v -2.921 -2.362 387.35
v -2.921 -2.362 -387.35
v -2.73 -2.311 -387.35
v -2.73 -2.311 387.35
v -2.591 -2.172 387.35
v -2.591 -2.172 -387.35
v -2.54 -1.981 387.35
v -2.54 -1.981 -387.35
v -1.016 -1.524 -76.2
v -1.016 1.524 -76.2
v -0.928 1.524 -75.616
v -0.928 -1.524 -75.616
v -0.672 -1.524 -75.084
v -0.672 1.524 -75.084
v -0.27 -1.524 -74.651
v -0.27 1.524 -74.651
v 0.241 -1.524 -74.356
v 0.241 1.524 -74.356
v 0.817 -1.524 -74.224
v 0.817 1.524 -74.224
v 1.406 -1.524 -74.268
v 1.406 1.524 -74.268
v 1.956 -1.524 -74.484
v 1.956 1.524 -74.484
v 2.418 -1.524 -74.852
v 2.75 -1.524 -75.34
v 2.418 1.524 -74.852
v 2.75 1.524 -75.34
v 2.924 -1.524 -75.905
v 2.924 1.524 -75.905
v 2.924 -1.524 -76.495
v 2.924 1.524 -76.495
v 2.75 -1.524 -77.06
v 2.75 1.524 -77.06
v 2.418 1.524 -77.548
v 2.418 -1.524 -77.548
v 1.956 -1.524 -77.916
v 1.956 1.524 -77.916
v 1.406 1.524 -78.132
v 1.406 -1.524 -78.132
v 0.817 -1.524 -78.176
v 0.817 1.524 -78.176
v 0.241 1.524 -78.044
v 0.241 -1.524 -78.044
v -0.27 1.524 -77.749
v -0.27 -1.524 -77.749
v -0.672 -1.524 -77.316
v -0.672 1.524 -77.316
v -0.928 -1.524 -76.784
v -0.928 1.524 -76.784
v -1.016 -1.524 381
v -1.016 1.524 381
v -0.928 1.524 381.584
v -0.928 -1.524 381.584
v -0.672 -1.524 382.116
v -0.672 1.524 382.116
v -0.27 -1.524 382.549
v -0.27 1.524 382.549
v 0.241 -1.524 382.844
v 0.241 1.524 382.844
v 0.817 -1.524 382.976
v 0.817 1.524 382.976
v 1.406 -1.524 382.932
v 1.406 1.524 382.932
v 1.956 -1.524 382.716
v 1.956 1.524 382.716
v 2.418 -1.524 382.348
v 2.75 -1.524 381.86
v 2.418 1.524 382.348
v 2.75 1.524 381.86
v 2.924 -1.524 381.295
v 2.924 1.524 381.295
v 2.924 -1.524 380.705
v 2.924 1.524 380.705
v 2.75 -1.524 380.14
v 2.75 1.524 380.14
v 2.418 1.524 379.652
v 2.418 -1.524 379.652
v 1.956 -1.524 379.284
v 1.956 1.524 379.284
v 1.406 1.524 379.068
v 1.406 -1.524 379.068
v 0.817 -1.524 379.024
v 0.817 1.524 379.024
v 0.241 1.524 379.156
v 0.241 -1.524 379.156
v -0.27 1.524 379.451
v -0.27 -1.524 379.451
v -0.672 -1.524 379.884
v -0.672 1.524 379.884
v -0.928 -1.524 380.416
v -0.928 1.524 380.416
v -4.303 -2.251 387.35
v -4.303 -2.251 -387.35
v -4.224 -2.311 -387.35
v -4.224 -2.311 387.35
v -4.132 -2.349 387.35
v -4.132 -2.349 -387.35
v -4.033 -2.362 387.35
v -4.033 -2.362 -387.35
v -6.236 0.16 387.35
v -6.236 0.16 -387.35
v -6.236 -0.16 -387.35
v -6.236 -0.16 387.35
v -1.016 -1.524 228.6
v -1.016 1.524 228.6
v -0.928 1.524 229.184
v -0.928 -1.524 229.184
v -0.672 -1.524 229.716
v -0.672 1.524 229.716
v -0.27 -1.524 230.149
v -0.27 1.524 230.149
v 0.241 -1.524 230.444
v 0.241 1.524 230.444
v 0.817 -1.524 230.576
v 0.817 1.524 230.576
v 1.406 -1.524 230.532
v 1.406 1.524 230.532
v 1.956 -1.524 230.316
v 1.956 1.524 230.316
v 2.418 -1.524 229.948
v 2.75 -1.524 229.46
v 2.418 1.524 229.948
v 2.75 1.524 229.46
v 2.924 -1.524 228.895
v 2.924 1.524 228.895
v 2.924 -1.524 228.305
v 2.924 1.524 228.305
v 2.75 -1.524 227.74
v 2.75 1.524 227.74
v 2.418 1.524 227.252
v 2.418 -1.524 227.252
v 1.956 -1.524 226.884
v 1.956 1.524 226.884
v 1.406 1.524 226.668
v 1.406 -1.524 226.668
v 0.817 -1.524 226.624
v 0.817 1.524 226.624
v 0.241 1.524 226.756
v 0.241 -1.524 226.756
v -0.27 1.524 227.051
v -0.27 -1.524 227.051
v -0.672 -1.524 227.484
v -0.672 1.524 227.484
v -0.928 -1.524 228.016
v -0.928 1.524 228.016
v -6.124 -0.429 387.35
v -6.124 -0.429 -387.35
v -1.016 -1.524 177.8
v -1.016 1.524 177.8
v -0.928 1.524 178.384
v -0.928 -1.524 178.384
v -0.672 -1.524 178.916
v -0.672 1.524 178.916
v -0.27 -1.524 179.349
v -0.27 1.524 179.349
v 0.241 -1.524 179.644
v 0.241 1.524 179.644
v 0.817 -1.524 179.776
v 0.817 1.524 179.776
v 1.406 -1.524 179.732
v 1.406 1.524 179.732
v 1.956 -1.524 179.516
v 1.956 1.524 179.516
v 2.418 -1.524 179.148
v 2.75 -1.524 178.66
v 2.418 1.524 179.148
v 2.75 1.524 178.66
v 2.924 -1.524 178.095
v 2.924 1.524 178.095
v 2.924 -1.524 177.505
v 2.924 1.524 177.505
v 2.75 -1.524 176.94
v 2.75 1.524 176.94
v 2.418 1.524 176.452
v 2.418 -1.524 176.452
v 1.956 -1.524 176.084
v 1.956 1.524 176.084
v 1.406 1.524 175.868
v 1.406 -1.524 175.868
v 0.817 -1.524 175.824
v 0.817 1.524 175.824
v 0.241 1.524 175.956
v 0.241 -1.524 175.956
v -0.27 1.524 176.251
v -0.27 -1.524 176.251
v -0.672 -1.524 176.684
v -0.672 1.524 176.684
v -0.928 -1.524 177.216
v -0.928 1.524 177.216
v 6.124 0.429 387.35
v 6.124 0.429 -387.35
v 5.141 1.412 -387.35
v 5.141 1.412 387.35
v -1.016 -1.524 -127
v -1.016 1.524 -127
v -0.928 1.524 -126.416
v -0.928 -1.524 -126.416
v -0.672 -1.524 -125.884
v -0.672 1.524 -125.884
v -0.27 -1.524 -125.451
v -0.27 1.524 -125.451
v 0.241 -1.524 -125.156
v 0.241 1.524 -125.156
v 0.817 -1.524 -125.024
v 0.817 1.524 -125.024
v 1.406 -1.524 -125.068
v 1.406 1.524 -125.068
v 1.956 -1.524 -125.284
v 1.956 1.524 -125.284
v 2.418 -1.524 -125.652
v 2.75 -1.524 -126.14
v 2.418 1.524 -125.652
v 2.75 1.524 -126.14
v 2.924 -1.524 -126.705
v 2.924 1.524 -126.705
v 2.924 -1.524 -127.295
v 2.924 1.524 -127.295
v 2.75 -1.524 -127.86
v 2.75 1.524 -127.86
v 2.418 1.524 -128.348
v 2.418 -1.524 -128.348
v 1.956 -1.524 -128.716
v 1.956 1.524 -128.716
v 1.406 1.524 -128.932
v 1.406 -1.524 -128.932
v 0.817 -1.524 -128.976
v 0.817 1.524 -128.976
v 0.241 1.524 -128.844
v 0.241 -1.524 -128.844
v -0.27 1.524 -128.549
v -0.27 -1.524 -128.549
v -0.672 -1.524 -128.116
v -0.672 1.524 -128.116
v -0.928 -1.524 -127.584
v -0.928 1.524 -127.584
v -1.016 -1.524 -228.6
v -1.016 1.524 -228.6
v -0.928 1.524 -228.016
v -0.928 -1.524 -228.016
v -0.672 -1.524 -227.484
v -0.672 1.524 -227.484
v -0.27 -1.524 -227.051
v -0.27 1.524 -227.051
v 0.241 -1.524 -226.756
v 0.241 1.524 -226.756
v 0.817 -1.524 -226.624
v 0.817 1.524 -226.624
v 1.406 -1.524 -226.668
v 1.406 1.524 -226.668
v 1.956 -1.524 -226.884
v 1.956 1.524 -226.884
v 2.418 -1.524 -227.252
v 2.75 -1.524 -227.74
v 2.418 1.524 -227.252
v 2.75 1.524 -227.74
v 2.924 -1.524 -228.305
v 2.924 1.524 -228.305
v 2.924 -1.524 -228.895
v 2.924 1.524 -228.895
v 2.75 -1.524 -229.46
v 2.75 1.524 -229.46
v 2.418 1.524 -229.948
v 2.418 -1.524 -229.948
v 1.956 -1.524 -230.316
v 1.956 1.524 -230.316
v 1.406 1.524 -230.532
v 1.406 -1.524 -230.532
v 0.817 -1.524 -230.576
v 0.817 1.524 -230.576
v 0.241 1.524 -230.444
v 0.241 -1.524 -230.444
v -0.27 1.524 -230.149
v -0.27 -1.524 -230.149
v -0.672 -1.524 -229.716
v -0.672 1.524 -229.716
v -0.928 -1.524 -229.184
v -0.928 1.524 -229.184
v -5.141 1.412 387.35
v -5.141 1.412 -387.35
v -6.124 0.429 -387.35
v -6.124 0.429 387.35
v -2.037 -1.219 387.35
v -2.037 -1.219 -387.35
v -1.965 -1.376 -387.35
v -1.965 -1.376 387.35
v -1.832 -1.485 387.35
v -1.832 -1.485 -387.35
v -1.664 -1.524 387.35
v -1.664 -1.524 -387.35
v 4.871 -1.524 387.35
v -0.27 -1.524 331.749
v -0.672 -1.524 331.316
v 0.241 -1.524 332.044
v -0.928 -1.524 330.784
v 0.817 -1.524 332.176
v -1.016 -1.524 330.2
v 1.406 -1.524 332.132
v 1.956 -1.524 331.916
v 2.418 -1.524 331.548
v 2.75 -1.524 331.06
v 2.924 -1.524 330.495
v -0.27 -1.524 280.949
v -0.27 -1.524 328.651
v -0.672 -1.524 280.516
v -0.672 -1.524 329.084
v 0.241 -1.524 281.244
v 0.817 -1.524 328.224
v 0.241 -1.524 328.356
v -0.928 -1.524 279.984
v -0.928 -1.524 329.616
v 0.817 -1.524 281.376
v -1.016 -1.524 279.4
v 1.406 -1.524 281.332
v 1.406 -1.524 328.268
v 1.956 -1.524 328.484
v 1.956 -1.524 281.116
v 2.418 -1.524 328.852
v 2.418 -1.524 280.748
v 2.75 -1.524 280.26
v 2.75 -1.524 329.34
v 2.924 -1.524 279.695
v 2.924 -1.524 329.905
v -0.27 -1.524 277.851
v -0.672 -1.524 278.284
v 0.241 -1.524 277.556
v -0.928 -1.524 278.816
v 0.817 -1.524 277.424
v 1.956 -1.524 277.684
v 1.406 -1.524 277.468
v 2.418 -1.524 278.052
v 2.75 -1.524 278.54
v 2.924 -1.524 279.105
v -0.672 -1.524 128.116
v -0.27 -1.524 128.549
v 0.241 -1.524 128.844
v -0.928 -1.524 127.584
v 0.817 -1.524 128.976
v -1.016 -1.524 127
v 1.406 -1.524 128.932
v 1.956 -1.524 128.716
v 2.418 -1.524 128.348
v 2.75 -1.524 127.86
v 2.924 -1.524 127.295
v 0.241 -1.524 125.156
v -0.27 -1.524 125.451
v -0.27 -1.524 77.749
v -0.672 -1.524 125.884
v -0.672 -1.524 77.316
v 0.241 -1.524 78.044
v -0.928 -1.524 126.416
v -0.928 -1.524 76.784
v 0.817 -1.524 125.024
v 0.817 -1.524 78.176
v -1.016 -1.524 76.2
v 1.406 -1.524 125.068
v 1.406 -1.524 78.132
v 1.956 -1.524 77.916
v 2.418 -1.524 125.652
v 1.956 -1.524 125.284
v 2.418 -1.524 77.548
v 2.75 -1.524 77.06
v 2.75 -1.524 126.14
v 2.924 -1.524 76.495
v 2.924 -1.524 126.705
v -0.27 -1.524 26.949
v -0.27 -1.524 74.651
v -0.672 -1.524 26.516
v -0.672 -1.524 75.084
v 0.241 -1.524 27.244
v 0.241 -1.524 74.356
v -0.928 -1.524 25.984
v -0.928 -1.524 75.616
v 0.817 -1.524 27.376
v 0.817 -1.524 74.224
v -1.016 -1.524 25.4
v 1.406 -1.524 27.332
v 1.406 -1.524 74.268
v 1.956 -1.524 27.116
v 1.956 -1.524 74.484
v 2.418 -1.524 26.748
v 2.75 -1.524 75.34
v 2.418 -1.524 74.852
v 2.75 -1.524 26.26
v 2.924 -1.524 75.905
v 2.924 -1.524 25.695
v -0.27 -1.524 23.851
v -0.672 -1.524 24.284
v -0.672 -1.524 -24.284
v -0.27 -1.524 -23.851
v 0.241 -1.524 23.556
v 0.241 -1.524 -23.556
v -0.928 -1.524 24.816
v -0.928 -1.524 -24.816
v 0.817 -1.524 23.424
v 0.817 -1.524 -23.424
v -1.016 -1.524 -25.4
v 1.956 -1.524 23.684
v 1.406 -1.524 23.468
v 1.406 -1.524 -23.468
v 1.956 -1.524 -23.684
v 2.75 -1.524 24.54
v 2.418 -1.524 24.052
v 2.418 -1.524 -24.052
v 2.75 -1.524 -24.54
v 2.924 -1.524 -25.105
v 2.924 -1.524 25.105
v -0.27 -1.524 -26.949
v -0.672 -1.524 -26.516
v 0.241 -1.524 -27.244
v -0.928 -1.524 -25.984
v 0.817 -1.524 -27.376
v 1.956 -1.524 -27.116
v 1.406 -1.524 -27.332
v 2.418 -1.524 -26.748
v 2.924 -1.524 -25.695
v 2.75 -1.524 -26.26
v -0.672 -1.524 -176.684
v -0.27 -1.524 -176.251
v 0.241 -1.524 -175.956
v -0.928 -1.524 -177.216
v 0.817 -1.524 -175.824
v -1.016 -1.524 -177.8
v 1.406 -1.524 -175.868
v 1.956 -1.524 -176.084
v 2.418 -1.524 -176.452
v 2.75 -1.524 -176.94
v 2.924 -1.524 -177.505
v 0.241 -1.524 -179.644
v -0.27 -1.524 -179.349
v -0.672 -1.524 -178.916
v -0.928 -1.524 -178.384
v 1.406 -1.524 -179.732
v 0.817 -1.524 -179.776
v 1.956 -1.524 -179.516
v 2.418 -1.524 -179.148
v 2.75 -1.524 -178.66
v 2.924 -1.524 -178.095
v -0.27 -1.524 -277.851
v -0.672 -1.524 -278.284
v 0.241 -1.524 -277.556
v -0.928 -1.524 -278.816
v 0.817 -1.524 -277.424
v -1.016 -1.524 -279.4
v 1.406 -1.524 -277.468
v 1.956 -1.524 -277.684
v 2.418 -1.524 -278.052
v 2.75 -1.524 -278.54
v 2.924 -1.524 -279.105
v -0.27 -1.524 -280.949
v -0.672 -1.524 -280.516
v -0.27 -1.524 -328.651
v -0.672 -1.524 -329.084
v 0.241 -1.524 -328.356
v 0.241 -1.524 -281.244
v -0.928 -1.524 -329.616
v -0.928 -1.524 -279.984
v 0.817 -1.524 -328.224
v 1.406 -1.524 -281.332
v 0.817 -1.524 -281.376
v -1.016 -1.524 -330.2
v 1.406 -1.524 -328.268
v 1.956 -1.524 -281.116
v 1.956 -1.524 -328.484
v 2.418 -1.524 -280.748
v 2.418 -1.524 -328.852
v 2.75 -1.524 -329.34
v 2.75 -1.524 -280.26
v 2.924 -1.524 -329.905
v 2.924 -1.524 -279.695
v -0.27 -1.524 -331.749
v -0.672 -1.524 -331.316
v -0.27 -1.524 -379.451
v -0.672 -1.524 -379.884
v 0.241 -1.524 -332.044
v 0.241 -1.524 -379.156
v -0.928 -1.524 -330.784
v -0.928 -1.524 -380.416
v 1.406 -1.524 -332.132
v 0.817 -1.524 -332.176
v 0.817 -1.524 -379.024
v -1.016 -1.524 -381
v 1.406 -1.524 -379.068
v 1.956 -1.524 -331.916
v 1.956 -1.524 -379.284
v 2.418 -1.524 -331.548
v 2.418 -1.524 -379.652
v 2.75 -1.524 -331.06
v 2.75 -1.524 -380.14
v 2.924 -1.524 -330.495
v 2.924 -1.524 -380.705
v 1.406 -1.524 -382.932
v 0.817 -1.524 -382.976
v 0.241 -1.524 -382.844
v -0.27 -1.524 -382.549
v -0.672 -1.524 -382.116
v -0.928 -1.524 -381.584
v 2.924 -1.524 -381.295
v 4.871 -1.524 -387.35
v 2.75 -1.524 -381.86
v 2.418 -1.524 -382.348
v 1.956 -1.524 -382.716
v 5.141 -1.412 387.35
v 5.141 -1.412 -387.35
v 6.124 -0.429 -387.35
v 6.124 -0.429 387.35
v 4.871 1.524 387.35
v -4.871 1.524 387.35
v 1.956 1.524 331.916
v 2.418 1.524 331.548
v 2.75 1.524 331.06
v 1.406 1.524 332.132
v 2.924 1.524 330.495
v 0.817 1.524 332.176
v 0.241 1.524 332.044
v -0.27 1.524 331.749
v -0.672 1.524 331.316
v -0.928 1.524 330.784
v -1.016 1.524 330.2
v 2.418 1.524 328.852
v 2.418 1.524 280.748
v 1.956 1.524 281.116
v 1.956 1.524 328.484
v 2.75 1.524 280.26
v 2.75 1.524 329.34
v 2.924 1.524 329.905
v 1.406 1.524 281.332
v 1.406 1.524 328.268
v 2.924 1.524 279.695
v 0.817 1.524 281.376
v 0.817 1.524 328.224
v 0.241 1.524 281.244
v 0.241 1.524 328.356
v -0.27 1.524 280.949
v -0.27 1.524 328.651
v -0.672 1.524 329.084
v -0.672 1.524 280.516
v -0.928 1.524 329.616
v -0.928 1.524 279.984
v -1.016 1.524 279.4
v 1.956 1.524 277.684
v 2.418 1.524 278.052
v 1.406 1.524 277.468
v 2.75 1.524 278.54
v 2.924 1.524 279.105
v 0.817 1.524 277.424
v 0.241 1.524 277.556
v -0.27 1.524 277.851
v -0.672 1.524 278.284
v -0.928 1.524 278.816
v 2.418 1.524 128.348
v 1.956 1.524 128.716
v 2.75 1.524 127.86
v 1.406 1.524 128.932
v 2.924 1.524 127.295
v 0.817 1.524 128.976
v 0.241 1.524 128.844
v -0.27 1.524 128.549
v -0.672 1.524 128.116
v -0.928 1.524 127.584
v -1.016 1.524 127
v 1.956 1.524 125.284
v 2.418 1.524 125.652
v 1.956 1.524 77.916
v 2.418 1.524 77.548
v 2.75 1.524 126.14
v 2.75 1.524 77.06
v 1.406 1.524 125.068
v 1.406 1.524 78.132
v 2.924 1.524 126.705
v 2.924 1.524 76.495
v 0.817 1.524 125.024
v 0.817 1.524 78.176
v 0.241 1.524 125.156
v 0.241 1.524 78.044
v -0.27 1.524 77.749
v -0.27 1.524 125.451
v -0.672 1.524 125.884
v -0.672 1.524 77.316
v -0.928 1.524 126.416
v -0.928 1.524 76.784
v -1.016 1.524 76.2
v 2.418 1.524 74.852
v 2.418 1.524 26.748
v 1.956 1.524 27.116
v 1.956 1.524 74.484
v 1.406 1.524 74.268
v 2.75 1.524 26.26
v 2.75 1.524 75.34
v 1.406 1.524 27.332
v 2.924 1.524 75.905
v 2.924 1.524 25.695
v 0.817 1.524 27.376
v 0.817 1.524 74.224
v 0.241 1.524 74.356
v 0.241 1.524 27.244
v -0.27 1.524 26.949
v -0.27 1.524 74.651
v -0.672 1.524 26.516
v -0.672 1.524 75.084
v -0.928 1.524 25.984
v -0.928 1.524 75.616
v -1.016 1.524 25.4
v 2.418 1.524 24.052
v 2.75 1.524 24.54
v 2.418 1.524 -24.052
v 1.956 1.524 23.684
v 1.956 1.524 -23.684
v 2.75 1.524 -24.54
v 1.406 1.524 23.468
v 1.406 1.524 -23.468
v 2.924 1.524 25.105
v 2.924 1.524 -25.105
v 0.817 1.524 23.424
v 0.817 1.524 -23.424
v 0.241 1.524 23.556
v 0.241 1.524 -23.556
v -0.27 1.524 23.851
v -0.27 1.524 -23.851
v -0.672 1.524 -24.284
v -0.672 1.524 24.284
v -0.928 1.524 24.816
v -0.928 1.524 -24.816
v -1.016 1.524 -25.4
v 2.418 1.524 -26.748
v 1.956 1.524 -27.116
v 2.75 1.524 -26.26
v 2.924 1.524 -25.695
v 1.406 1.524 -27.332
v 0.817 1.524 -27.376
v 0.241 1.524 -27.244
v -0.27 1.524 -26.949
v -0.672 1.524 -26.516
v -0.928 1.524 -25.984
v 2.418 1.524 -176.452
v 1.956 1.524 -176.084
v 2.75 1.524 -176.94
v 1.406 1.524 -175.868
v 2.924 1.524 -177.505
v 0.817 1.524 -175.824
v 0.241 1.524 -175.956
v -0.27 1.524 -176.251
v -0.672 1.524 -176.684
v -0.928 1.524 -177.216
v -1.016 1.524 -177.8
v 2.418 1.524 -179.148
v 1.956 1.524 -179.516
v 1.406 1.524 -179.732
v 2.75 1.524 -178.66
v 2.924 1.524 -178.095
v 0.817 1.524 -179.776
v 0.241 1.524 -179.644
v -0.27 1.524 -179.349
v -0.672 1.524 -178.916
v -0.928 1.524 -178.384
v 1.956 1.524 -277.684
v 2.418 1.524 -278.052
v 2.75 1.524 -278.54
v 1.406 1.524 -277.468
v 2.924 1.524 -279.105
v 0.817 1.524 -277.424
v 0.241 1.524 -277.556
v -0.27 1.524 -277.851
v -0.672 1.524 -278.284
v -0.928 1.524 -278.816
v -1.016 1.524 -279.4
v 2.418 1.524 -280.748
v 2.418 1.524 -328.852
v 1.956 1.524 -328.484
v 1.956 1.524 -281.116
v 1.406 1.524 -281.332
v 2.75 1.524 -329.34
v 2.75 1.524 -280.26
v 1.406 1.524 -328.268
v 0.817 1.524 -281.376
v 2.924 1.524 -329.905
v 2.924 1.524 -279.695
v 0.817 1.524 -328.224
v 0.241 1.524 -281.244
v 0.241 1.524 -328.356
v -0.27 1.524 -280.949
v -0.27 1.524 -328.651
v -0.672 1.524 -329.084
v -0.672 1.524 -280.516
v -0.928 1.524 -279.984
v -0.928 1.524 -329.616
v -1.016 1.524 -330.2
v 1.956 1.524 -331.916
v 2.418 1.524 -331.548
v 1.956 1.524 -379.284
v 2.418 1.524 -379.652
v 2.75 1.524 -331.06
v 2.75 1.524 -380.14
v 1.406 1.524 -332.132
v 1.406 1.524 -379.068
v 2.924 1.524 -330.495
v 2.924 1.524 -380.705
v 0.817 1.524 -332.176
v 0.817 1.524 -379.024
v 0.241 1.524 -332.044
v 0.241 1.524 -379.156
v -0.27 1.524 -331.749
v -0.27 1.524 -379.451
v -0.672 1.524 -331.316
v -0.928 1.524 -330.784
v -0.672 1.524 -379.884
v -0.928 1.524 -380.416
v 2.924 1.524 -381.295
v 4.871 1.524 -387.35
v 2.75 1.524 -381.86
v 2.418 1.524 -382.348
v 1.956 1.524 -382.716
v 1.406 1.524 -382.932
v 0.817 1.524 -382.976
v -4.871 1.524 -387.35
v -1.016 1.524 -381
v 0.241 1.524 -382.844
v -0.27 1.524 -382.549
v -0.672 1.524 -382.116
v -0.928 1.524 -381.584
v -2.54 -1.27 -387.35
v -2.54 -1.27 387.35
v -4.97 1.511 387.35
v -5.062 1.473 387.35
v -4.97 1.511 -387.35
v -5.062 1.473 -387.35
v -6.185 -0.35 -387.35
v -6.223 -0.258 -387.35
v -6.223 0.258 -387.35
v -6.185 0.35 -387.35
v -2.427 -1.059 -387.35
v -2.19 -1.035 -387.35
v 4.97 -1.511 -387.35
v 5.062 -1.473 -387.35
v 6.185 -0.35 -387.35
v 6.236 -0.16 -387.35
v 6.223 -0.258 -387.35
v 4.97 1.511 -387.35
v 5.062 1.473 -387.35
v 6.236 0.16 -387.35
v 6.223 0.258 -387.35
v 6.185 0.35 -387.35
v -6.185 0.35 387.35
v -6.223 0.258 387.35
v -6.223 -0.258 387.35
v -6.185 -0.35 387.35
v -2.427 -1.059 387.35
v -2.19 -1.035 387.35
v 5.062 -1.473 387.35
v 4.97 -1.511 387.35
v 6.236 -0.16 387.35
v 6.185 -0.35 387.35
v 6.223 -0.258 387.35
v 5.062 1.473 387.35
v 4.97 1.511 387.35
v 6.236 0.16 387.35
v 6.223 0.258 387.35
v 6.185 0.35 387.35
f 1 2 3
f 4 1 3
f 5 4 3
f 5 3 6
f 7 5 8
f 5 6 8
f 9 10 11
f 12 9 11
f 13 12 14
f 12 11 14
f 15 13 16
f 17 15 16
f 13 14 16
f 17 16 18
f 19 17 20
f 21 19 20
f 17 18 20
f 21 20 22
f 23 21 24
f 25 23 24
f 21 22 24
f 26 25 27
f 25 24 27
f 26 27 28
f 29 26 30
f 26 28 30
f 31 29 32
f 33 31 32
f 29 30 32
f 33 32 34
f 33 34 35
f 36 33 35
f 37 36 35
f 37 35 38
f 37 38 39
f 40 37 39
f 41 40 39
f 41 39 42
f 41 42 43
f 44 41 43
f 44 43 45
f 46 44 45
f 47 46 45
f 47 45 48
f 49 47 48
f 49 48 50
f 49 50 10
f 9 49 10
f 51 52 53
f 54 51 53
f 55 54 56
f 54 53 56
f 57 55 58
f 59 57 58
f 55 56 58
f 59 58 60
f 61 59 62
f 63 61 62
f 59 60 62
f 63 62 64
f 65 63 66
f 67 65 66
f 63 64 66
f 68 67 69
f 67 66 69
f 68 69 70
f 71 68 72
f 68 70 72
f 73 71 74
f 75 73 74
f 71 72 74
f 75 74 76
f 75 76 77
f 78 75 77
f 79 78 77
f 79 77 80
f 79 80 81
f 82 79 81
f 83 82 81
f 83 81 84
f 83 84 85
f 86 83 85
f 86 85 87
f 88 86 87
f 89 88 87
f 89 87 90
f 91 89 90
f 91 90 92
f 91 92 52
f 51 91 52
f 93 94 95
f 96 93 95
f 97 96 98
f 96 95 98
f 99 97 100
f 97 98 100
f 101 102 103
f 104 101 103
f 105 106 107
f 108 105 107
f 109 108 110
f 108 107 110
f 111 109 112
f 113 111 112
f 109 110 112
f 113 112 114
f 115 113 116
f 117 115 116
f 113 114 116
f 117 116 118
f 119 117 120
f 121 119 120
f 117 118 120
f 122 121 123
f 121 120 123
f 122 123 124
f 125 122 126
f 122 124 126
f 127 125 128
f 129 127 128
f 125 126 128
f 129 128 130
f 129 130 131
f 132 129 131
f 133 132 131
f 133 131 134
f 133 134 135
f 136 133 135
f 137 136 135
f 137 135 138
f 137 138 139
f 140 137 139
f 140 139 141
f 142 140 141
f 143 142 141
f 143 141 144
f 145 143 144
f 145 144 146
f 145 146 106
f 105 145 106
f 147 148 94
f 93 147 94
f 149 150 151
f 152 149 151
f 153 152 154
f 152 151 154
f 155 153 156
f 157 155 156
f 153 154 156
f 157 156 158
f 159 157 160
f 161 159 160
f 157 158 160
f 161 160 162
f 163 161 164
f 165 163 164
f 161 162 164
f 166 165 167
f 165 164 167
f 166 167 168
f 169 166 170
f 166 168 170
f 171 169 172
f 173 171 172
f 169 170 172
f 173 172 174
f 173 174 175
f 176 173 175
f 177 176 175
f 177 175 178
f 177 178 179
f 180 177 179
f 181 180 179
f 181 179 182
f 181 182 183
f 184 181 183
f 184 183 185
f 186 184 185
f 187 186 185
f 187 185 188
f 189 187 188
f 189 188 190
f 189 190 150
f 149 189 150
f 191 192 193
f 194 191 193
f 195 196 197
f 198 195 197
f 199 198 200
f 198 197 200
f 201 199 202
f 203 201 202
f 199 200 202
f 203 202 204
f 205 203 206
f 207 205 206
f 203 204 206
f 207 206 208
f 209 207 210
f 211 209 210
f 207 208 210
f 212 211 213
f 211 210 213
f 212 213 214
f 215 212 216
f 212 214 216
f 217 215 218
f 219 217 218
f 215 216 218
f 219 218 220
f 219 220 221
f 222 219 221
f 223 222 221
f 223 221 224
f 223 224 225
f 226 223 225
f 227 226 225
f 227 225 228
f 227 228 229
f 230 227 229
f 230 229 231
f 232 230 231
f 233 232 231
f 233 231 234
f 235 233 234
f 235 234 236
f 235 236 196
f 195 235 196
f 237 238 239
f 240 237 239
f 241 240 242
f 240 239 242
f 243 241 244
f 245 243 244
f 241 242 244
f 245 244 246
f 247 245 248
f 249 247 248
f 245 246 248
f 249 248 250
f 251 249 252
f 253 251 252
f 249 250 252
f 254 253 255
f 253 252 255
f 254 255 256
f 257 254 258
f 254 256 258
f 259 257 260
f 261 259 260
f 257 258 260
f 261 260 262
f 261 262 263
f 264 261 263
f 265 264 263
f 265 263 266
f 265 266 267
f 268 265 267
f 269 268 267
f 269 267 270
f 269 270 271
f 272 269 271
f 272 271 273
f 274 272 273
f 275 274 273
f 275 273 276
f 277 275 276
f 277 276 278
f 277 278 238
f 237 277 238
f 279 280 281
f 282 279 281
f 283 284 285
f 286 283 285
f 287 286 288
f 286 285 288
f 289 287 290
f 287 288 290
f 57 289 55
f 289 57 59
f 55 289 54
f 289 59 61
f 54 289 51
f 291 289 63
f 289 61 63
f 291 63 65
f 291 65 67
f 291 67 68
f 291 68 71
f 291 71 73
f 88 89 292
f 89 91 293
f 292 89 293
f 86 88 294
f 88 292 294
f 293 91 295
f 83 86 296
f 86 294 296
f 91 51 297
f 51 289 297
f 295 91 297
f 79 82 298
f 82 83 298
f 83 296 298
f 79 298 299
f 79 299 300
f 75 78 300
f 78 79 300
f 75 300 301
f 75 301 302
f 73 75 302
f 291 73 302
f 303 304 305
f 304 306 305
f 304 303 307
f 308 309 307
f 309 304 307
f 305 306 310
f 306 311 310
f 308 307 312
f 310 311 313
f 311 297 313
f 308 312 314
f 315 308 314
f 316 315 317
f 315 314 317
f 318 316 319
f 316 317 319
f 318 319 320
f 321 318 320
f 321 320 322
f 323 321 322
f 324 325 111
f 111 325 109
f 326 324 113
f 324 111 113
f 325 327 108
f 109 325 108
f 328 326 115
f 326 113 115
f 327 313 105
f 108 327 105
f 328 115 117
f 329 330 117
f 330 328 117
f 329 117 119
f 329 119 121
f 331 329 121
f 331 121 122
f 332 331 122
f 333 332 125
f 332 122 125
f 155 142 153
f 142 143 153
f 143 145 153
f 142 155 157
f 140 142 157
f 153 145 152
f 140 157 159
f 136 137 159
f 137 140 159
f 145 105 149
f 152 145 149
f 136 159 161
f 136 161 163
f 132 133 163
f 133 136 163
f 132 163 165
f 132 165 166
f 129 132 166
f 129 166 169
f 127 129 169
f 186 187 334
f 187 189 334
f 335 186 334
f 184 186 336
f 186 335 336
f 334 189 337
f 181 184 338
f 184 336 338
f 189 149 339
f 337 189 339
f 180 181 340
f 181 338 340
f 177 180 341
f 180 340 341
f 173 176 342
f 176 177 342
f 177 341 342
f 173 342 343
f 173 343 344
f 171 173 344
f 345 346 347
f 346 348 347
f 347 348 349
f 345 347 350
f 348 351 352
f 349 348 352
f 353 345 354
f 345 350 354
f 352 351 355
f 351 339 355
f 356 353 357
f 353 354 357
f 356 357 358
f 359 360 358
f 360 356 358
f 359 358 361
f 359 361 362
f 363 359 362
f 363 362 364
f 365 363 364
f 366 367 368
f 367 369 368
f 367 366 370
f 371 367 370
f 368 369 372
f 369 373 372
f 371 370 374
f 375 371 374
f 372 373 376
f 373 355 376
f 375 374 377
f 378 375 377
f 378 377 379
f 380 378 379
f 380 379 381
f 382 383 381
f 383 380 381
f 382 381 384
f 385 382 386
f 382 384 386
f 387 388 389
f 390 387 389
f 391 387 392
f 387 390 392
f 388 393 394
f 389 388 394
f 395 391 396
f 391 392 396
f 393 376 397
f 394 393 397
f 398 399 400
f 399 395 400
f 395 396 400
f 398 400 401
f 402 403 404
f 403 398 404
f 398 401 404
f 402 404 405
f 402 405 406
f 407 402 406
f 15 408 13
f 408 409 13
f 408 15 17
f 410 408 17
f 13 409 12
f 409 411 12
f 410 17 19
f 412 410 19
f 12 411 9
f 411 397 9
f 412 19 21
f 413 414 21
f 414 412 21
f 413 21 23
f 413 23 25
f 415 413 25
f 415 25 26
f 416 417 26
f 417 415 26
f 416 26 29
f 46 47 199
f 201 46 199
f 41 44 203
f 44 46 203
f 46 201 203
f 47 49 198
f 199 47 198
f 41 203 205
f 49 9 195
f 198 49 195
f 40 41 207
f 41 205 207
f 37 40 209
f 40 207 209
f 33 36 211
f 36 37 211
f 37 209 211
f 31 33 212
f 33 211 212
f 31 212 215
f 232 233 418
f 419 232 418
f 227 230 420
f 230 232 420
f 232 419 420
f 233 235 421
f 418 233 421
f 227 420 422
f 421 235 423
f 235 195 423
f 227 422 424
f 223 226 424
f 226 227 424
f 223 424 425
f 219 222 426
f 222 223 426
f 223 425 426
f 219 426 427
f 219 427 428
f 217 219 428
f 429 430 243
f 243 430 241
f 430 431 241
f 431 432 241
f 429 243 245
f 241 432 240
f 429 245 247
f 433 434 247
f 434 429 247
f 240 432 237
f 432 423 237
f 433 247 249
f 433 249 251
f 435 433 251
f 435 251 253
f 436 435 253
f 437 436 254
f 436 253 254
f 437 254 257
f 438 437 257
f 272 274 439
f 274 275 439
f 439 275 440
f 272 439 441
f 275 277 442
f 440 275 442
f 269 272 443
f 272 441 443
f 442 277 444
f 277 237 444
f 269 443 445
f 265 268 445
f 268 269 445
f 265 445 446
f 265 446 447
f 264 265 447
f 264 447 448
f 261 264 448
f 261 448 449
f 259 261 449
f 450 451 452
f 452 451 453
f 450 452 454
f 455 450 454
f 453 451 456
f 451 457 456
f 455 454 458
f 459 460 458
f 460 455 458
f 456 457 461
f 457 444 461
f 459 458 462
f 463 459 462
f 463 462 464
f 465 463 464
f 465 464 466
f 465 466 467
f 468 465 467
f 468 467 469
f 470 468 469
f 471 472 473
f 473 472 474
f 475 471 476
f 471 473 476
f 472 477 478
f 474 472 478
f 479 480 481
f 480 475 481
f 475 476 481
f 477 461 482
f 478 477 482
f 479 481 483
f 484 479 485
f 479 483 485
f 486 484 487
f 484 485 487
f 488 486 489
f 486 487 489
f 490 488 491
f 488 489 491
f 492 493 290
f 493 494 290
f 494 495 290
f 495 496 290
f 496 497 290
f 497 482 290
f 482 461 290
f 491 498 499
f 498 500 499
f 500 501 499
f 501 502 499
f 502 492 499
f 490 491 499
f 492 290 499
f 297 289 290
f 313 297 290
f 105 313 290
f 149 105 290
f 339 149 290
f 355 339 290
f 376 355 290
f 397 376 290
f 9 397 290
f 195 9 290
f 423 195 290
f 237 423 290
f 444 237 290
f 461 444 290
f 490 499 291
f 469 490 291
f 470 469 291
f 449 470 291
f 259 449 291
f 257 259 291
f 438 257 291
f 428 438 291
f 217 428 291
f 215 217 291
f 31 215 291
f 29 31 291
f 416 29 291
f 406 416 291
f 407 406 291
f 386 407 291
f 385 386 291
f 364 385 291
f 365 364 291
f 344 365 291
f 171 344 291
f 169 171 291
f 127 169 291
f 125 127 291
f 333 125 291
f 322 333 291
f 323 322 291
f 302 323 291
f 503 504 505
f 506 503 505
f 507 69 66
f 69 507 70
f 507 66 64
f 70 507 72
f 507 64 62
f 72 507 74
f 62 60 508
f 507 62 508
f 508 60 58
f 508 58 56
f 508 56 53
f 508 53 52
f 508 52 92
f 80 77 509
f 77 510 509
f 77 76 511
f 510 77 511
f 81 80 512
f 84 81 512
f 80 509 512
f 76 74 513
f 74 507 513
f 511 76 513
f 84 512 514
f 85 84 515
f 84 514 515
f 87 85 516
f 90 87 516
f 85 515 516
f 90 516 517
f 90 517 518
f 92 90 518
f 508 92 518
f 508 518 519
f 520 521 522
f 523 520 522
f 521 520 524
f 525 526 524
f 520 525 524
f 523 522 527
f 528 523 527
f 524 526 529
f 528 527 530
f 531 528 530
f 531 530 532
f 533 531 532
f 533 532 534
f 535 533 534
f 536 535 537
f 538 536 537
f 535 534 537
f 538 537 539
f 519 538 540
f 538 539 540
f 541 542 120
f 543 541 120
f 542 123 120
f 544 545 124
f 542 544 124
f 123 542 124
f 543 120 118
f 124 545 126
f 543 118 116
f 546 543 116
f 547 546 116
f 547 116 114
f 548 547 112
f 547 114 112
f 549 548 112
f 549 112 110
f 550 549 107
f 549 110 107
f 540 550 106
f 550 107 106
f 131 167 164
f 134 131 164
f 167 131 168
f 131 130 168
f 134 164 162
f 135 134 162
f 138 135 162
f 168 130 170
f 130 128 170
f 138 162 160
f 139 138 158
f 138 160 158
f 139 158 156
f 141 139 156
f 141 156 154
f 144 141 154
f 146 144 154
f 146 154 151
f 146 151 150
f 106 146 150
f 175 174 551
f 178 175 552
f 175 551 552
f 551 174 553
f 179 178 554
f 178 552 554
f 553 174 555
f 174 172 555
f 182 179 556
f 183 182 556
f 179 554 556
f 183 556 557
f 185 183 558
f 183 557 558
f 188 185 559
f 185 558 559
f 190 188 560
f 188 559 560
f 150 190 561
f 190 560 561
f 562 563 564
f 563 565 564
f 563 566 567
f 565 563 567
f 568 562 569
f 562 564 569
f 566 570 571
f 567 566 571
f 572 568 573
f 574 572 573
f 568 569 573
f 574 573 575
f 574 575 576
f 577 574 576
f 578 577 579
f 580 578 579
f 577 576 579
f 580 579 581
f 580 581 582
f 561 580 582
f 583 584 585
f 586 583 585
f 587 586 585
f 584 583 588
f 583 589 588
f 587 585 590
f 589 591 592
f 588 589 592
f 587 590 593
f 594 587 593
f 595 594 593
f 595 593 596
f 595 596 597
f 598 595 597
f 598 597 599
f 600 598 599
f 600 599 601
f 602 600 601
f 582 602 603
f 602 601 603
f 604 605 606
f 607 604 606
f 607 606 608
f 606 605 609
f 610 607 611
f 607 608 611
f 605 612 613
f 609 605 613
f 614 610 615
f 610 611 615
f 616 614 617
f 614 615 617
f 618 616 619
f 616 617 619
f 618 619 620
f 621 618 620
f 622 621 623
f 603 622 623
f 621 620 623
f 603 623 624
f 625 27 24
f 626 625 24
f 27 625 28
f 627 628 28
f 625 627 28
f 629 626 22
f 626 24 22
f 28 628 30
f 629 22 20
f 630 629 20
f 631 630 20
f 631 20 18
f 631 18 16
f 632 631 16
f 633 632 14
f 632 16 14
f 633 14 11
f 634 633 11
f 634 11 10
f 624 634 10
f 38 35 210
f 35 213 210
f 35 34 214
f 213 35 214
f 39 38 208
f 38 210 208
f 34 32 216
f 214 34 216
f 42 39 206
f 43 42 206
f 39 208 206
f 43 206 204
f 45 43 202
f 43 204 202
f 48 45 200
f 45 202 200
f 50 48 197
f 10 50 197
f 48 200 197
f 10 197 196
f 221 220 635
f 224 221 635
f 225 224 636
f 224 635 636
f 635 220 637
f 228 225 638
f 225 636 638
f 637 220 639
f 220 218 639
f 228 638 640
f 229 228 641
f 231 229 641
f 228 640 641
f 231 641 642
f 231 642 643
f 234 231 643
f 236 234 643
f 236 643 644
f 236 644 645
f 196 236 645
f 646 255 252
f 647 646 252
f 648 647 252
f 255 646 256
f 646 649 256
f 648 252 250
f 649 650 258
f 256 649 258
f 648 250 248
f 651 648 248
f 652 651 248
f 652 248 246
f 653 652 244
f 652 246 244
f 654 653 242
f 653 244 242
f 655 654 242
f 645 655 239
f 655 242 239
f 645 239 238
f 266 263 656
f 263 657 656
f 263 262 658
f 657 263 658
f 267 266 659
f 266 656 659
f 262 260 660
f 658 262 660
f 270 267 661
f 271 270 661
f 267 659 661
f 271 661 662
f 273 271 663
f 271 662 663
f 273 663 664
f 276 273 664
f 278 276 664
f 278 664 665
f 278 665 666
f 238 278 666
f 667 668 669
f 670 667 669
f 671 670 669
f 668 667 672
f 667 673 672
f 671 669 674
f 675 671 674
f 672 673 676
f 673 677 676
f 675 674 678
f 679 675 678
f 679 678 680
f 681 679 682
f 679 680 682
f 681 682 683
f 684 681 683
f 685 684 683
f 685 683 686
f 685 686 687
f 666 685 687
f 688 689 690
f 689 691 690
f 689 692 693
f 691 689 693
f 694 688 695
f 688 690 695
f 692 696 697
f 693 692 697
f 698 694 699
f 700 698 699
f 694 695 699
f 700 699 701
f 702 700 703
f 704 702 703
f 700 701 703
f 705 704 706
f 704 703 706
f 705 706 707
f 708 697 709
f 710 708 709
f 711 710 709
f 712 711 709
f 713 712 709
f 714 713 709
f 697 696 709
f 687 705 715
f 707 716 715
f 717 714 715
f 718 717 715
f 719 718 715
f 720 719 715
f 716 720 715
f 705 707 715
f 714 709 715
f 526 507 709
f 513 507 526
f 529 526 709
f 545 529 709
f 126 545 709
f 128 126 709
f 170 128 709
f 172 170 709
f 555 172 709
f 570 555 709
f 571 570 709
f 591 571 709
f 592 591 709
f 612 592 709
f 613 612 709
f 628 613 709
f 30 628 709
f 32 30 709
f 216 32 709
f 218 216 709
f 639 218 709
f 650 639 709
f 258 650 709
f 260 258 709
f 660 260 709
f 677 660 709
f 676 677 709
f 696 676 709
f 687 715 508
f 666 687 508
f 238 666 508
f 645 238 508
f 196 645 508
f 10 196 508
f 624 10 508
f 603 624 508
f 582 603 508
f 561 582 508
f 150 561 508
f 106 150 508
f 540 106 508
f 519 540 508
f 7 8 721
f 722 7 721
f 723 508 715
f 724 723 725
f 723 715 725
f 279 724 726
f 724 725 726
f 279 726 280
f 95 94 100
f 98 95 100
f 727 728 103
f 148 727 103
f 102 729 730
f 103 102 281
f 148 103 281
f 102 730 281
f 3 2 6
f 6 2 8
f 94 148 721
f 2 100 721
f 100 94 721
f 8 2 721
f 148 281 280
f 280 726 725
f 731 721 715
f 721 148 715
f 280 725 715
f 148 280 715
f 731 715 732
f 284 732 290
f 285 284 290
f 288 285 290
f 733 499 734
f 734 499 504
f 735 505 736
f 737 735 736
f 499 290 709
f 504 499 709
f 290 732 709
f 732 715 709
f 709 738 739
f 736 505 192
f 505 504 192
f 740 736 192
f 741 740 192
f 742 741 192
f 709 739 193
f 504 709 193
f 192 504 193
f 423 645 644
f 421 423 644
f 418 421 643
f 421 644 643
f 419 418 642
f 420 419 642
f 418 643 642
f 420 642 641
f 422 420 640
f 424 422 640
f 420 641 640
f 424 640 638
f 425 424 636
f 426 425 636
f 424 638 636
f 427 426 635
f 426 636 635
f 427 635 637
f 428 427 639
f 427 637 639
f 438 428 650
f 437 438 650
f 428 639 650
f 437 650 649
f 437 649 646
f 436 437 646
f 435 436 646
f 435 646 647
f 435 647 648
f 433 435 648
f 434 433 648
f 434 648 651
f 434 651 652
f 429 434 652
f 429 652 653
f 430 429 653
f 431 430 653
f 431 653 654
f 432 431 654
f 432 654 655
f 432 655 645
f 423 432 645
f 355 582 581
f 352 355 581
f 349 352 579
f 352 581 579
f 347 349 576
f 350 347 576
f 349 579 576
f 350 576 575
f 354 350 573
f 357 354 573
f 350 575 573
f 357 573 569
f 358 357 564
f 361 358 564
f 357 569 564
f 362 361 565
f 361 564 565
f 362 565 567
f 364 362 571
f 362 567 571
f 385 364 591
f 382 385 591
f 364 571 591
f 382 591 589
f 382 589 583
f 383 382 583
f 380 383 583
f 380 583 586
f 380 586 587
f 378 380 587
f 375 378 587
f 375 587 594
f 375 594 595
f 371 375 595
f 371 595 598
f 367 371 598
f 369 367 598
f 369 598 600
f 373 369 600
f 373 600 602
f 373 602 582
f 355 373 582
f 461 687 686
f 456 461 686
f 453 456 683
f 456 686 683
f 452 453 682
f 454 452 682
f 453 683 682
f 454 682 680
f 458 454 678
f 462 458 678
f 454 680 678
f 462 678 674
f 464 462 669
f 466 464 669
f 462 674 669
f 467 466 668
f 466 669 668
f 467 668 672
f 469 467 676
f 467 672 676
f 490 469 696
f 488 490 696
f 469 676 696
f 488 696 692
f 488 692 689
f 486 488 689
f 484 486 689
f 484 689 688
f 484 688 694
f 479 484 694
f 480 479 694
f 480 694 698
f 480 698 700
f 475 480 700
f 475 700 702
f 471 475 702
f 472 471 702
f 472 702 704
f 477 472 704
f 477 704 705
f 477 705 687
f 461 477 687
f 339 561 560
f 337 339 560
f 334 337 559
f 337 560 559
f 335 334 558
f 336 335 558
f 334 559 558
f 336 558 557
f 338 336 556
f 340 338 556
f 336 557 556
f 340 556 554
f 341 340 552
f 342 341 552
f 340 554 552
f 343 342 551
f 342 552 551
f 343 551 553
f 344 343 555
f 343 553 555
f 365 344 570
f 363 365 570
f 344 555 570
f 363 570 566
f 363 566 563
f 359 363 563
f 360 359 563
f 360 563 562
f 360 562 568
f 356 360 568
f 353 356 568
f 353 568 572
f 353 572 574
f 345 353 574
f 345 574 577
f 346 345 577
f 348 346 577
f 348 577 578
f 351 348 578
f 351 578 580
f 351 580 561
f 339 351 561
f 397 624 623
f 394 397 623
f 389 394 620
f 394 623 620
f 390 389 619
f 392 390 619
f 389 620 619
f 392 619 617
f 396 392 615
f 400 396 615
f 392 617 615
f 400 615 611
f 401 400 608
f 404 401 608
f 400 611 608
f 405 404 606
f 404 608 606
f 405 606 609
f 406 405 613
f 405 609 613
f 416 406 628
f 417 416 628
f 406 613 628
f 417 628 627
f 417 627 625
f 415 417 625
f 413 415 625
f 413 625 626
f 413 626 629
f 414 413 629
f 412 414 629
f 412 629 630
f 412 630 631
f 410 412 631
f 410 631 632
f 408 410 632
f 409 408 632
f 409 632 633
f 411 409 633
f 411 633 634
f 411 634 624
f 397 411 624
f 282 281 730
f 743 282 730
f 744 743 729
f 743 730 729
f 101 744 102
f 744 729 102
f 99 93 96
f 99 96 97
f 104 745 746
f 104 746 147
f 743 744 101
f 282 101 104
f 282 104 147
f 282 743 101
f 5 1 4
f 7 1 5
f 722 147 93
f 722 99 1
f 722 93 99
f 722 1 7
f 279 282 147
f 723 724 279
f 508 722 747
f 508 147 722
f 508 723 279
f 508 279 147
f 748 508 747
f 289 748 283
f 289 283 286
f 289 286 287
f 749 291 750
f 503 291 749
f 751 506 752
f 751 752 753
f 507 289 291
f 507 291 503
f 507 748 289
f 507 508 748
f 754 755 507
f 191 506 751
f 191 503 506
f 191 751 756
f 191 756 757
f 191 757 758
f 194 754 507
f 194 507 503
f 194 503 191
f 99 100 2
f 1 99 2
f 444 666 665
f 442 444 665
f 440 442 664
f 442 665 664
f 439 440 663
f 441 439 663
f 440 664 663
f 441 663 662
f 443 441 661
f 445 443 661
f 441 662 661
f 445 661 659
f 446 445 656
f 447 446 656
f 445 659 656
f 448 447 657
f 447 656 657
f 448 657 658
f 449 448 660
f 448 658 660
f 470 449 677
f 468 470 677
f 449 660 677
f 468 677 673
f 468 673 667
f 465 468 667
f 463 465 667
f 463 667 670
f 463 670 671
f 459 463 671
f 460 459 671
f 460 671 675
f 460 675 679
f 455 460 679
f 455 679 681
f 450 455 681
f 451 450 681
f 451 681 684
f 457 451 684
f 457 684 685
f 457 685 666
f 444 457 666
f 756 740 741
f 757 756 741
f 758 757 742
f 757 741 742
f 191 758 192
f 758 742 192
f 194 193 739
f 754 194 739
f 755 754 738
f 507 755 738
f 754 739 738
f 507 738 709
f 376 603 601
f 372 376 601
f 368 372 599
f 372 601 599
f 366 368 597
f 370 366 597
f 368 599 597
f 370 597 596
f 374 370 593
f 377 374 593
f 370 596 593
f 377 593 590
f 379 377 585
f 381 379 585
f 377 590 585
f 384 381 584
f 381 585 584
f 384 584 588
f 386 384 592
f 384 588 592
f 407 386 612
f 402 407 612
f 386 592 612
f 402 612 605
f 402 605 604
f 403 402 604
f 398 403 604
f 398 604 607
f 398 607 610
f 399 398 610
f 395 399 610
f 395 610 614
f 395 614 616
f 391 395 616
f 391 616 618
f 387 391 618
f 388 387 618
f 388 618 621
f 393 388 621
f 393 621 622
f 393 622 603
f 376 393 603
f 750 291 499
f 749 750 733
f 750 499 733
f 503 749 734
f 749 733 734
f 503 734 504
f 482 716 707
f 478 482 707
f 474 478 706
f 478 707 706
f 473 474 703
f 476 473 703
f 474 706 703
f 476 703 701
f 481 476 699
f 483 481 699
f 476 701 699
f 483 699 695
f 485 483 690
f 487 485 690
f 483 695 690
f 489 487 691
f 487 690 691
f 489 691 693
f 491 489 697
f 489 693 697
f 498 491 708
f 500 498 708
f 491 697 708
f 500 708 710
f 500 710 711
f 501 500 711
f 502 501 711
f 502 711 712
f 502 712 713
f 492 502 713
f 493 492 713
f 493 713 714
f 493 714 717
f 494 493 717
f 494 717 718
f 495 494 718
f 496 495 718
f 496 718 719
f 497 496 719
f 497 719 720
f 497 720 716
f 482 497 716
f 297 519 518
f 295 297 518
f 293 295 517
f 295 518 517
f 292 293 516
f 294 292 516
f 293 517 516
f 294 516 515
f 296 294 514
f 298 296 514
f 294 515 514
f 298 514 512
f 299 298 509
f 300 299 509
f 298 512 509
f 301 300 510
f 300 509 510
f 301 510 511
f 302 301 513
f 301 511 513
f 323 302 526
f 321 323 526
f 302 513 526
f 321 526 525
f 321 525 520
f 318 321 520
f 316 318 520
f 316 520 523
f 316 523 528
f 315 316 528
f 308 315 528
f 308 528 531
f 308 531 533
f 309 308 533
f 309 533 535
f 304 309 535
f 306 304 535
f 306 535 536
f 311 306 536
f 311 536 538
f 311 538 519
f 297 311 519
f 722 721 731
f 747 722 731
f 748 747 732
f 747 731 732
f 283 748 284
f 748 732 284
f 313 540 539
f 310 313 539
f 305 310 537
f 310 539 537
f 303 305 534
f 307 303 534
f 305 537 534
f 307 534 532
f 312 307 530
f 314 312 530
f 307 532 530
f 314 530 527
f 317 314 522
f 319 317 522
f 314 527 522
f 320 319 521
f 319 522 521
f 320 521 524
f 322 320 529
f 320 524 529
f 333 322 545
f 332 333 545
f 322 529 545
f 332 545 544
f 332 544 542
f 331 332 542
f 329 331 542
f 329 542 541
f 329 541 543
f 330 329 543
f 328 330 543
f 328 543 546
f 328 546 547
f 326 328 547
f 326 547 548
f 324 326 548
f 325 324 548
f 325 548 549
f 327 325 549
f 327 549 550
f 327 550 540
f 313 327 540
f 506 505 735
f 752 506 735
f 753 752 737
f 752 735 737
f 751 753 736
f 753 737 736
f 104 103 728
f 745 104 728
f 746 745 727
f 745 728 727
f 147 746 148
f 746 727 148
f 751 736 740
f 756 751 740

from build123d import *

# Parameters (mm, degrees)
BOSS_EXTRUDE1_START = -387.35
BOSS_EXTRUDE1_DEPTH = 774.7
SKETCH2_R           = 1.9812
CUT_EXTRUDE1_DEPTH  = 388.419680715
LPATTERN1_COUNT     = 16
LPATTERN1_PITCH     = 50.8


# Read off the part's stored shape, not the designer's step: Boss-Extrude1
with BuildPart() as part:
    # Boss-Extrude1 outline → Boss-Extrude1 (new body)
    with BuildSketch(Plane.XY.offset(BOSS_EXTRUDE1_START)):
        with BuildLine():
            ThreePointArc((-4.871384633, 1.524), (-5.01718702, 1.494998102), (-5.140792316, 1.412407684))
            Line((-5.140792316, 1.412407684), (-6.124107684, 0.429092316))
            ThreePointArc((-6.124107684, 0.429092316), (-6.206698102, 0.30548702), (-6.2357, 0.159684633))
            Line((-6.2357, 0.159684633), (-6.2357, -0.159684633))
            ThreePointArc((-6.2357, -0.159684633), (-6.206698102, -0.30548702), (-6.124107684, -0.429092316))
            Line((-6.124107684, -0.429092316), (-4.302592316, -2.250607684))
            ThreePointArc((-4.302592316, -2.250607684), (-4.17898702, -2.333198102), (-4.033184633, -2.3622))
            Line((-4.033184633, -2.3622), (-2.921, -2.3622))
            ThreePointArc((-2.921, -2.3622), (-2.651592316, -2.250607684), (-2.54, -1.9812))
            Line((-2.54, -1.9812), (-2.54, -1.27))
            ThreePointArc((-2.54, -1.27), (-2.311529276, -1.017286217), (-2.037131842, -1.2192))
            ThreePointArc((-2.037131842, -1.2192), (-1.904795163, -1.438121331), (-1.663829605, -1.524))
            Line((-1.663829605, -1.524), (4.871384633, -1.524))
            ThreePointArc((4.871384633, -1.524), (5.01718702, -1.494998102), (5.140792316, -1.412407684))
            Line((5.140792316, -1.412407684), (6.124107684, -0.429092316))
            ThreePointArc((6.124107684, -0.429092316), (6.206698102, -0.30548702), (6.2357, -0.159684633))
            Line((6.2357, -0.159684633), (6.2357, 0.159684633))
            ThreePointArc((6.2357, 0.159684633), (6.206698102, 0.30548702), (6.124107684, 0.429092316))
            Line((6.124107684, 0.429092316), (5.140792316, 1.412407684))
            ThreePointArc((5.140792316, 1.412407684), (5.01718702, 1.494998102), (4.871384633, 1.524))
            Line((4.871384633, 1.524), (-4.871384633, 1.524))
        make_face()
    extrude(amount=BOSS_EXTRUDE1_DEPTH)

    # Sketch2 → Cut-Extrude1 (cut, through all)
    with BuildSketch(Plane(origin=(0, 1.524, 0), x_dir=(1, 0, 0), z_dir=(0, 1, 0))):
        with Locations(Location((0.9652, -381, 0), (0, 0, 180))):
            Circle(SKETCH2_R)
    cut_extrude1 = extrude(amount=-CUT_EXTRUDE1_DEPTH, mode=Mode.SUBTRACT)

    # LPattern1: Cut-Extrude1 ×16
    with Locations(*[(0, 0, -i * LPATTERN1_PITCH) for i in range(1, LPATTERN1_COUNT)]):
        add(cut_extrude1, mode=Mode.SUBTRACT)


solid = part.part
